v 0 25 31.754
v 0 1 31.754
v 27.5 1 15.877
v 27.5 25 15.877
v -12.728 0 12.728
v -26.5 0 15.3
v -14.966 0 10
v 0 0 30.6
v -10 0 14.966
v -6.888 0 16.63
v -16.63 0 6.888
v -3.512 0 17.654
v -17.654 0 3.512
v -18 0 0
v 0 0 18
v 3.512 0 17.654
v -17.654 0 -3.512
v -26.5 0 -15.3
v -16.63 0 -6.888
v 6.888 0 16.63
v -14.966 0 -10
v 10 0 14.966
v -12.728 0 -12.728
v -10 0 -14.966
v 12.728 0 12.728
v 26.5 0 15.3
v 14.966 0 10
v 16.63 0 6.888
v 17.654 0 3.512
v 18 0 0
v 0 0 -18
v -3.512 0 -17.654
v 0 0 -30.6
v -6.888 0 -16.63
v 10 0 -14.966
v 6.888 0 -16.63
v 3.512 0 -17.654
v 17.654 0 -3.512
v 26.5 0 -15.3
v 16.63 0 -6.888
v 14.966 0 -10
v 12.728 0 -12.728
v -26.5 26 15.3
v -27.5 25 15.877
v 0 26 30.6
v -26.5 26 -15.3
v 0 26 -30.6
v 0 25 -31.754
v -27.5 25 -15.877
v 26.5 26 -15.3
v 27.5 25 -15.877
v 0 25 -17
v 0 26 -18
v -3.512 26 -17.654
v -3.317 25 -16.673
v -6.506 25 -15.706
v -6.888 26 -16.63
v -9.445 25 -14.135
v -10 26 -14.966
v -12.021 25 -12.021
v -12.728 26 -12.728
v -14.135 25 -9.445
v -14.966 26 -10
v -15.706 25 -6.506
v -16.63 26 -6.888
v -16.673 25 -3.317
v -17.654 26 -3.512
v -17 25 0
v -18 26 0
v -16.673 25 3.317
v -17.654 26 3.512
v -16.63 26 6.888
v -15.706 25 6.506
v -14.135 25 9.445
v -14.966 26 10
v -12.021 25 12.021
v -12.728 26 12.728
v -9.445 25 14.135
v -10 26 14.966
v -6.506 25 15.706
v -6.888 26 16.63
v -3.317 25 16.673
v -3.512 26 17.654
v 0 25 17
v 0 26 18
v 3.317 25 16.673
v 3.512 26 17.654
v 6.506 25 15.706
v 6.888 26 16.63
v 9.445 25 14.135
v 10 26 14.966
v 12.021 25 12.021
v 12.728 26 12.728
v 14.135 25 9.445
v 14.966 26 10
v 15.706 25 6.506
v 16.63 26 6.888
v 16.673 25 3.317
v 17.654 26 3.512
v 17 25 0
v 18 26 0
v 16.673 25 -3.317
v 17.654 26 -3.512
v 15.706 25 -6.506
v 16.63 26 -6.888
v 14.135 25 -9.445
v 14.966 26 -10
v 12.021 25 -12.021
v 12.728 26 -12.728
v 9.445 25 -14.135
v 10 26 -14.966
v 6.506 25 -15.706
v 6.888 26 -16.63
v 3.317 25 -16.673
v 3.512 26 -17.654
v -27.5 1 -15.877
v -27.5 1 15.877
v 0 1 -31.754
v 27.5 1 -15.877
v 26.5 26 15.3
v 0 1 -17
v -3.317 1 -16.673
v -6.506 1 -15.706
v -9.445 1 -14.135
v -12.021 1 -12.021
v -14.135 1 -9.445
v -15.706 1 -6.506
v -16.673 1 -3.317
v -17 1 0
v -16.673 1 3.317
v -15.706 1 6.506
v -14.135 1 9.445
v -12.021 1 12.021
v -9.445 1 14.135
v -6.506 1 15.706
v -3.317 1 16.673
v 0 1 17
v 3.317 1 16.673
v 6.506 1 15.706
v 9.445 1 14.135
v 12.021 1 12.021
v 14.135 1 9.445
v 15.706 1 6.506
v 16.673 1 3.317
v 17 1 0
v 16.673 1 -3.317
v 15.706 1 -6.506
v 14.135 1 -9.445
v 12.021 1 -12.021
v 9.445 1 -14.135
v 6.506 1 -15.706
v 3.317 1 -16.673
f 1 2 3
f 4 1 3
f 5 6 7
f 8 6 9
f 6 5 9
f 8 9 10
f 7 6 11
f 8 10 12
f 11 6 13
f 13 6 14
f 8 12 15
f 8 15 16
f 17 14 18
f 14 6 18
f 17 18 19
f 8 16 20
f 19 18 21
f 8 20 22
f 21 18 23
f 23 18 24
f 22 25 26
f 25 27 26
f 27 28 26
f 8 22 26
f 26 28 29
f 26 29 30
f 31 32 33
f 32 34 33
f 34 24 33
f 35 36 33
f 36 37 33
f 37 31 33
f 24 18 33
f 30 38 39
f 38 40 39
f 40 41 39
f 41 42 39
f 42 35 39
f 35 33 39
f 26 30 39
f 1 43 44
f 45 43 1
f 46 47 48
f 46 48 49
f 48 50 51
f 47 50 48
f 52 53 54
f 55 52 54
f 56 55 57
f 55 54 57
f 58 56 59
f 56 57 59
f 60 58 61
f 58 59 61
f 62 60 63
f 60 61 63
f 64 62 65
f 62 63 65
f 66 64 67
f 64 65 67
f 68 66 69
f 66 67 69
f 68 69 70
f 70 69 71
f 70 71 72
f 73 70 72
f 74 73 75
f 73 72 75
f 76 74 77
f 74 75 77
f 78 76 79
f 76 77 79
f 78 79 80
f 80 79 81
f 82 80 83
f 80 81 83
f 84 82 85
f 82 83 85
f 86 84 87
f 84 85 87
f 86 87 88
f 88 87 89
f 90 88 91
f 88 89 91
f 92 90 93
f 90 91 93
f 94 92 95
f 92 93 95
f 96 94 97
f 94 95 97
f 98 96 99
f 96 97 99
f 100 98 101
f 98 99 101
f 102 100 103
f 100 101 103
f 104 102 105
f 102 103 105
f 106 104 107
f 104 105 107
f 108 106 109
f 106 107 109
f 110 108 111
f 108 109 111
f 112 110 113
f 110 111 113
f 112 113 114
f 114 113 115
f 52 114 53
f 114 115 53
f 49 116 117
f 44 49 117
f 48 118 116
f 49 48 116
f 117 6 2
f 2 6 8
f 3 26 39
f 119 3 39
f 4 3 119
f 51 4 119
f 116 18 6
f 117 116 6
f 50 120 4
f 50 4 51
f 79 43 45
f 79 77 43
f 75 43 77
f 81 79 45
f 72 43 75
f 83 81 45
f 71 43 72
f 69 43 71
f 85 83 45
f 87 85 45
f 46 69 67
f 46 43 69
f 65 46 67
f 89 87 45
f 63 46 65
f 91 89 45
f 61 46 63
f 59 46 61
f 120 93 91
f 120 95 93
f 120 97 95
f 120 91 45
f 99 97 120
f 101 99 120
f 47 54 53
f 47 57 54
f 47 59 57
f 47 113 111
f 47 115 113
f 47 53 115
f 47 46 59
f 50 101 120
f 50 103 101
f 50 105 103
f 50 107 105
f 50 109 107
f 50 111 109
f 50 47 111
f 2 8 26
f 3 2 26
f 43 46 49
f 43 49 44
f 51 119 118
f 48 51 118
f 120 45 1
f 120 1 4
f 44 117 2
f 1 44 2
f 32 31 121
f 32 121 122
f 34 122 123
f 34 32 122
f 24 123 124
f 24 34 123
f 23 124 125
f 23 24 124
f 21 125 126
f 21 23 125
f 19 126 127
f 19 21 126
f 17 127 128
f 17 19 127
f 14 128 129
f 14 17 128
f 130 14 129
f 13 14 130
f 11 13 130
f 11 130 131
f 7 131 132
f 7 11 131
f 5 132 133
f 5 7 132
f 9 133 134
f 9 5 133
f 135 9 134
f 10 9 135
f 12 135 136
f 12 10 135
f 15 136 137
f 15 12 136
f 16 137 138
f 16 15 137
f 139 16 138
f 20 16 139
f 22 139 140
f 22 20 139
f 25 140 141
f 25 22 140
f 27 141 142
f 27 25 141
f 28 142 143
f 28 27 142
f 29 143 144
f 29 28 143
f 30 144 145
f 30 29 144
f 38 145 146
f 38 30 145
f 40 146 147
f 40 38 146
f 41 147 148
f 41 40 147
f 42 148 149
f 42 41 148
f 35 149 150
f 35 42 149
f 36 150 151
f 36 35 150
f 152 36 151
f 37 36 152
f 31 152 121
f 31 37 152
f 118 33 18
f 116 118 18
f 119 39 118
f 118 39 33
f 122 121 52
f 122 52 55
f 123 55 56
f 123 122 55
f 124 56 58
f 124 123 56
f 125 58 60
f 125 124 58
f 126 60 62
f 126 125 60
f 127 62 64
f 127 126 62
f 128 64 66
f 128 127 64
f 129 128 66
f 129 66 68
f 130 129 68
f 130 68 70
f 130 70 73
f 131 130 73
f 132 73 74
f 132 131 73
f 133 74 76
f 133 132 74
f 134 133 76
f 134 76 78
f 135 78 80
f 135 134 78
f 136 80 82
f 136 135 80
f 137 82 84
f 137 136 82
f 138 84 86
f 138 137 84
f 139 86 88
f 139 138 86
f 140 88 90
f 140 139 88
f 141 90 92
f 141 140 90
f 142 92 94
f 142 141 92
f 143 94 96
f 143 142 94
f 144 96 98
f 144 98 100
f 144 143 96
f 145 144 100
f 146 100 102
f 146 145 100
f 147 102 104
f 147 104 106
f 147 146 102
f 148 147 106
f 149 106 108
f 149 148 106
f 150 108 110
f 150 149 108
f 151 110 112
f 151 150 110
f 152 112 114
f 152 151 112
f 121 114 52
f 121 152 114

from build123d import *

# Parameters (mm, degrees)
SKETCH_1_R      = 17
EXTRUDE_1_DEPTH = 26
CHAMFER_1_SIZE  = 1


with BuildPart() as part:
    # Эскиз1 → Бобышка-Вытянуть1 (new body)
    with BuildSketch(Plane(origin=(0, 0, 0), x_dir=(1, 0, 0), z_dir=(0, 1, 0))):
        Polygon((0, 31.754264805), (-27.5, 15.877132403), (-27.5, -15.877132403), (0, -31.754264805), (27.5, -15.877132403), (27.5, 15.877132403), align=None)
        with Locations(Location((0, 0, 0), (0, 0, 90))):
            Circle(SKETCH_1_R, mode=Mode.SUBTRACT)
    extrude(amount=EXTRUDE_1_DEPTH)

    # Фаска1
    chamfer_1_edges = [part.edges().sort_by_distance(p)[0] for p in [
        (-27.5, 26, 0),
        (-13.75, 26, 23.815698604),
        (0, 0, 17),
        (0, 26, 17),
        (13.75, 26, 23.815698604),
        (27.5, 26, 0),
        (13.75, 26, -23.815698604),
        (27.5, 0, 0),
        (13.75, 0, 23.815698604),
        (-13.75, 0, 23.815698604),
        (-27.5, 0, 0),
        (-13.75, 0, -23.815698604),
        (13.75, 0, -23.815698604),
        (-13.75, 26, -23.815698604),
    ]]
    chamfer(chamfer_1_edges, length=CHAMFER_1_SIZE)


solid = part.part
